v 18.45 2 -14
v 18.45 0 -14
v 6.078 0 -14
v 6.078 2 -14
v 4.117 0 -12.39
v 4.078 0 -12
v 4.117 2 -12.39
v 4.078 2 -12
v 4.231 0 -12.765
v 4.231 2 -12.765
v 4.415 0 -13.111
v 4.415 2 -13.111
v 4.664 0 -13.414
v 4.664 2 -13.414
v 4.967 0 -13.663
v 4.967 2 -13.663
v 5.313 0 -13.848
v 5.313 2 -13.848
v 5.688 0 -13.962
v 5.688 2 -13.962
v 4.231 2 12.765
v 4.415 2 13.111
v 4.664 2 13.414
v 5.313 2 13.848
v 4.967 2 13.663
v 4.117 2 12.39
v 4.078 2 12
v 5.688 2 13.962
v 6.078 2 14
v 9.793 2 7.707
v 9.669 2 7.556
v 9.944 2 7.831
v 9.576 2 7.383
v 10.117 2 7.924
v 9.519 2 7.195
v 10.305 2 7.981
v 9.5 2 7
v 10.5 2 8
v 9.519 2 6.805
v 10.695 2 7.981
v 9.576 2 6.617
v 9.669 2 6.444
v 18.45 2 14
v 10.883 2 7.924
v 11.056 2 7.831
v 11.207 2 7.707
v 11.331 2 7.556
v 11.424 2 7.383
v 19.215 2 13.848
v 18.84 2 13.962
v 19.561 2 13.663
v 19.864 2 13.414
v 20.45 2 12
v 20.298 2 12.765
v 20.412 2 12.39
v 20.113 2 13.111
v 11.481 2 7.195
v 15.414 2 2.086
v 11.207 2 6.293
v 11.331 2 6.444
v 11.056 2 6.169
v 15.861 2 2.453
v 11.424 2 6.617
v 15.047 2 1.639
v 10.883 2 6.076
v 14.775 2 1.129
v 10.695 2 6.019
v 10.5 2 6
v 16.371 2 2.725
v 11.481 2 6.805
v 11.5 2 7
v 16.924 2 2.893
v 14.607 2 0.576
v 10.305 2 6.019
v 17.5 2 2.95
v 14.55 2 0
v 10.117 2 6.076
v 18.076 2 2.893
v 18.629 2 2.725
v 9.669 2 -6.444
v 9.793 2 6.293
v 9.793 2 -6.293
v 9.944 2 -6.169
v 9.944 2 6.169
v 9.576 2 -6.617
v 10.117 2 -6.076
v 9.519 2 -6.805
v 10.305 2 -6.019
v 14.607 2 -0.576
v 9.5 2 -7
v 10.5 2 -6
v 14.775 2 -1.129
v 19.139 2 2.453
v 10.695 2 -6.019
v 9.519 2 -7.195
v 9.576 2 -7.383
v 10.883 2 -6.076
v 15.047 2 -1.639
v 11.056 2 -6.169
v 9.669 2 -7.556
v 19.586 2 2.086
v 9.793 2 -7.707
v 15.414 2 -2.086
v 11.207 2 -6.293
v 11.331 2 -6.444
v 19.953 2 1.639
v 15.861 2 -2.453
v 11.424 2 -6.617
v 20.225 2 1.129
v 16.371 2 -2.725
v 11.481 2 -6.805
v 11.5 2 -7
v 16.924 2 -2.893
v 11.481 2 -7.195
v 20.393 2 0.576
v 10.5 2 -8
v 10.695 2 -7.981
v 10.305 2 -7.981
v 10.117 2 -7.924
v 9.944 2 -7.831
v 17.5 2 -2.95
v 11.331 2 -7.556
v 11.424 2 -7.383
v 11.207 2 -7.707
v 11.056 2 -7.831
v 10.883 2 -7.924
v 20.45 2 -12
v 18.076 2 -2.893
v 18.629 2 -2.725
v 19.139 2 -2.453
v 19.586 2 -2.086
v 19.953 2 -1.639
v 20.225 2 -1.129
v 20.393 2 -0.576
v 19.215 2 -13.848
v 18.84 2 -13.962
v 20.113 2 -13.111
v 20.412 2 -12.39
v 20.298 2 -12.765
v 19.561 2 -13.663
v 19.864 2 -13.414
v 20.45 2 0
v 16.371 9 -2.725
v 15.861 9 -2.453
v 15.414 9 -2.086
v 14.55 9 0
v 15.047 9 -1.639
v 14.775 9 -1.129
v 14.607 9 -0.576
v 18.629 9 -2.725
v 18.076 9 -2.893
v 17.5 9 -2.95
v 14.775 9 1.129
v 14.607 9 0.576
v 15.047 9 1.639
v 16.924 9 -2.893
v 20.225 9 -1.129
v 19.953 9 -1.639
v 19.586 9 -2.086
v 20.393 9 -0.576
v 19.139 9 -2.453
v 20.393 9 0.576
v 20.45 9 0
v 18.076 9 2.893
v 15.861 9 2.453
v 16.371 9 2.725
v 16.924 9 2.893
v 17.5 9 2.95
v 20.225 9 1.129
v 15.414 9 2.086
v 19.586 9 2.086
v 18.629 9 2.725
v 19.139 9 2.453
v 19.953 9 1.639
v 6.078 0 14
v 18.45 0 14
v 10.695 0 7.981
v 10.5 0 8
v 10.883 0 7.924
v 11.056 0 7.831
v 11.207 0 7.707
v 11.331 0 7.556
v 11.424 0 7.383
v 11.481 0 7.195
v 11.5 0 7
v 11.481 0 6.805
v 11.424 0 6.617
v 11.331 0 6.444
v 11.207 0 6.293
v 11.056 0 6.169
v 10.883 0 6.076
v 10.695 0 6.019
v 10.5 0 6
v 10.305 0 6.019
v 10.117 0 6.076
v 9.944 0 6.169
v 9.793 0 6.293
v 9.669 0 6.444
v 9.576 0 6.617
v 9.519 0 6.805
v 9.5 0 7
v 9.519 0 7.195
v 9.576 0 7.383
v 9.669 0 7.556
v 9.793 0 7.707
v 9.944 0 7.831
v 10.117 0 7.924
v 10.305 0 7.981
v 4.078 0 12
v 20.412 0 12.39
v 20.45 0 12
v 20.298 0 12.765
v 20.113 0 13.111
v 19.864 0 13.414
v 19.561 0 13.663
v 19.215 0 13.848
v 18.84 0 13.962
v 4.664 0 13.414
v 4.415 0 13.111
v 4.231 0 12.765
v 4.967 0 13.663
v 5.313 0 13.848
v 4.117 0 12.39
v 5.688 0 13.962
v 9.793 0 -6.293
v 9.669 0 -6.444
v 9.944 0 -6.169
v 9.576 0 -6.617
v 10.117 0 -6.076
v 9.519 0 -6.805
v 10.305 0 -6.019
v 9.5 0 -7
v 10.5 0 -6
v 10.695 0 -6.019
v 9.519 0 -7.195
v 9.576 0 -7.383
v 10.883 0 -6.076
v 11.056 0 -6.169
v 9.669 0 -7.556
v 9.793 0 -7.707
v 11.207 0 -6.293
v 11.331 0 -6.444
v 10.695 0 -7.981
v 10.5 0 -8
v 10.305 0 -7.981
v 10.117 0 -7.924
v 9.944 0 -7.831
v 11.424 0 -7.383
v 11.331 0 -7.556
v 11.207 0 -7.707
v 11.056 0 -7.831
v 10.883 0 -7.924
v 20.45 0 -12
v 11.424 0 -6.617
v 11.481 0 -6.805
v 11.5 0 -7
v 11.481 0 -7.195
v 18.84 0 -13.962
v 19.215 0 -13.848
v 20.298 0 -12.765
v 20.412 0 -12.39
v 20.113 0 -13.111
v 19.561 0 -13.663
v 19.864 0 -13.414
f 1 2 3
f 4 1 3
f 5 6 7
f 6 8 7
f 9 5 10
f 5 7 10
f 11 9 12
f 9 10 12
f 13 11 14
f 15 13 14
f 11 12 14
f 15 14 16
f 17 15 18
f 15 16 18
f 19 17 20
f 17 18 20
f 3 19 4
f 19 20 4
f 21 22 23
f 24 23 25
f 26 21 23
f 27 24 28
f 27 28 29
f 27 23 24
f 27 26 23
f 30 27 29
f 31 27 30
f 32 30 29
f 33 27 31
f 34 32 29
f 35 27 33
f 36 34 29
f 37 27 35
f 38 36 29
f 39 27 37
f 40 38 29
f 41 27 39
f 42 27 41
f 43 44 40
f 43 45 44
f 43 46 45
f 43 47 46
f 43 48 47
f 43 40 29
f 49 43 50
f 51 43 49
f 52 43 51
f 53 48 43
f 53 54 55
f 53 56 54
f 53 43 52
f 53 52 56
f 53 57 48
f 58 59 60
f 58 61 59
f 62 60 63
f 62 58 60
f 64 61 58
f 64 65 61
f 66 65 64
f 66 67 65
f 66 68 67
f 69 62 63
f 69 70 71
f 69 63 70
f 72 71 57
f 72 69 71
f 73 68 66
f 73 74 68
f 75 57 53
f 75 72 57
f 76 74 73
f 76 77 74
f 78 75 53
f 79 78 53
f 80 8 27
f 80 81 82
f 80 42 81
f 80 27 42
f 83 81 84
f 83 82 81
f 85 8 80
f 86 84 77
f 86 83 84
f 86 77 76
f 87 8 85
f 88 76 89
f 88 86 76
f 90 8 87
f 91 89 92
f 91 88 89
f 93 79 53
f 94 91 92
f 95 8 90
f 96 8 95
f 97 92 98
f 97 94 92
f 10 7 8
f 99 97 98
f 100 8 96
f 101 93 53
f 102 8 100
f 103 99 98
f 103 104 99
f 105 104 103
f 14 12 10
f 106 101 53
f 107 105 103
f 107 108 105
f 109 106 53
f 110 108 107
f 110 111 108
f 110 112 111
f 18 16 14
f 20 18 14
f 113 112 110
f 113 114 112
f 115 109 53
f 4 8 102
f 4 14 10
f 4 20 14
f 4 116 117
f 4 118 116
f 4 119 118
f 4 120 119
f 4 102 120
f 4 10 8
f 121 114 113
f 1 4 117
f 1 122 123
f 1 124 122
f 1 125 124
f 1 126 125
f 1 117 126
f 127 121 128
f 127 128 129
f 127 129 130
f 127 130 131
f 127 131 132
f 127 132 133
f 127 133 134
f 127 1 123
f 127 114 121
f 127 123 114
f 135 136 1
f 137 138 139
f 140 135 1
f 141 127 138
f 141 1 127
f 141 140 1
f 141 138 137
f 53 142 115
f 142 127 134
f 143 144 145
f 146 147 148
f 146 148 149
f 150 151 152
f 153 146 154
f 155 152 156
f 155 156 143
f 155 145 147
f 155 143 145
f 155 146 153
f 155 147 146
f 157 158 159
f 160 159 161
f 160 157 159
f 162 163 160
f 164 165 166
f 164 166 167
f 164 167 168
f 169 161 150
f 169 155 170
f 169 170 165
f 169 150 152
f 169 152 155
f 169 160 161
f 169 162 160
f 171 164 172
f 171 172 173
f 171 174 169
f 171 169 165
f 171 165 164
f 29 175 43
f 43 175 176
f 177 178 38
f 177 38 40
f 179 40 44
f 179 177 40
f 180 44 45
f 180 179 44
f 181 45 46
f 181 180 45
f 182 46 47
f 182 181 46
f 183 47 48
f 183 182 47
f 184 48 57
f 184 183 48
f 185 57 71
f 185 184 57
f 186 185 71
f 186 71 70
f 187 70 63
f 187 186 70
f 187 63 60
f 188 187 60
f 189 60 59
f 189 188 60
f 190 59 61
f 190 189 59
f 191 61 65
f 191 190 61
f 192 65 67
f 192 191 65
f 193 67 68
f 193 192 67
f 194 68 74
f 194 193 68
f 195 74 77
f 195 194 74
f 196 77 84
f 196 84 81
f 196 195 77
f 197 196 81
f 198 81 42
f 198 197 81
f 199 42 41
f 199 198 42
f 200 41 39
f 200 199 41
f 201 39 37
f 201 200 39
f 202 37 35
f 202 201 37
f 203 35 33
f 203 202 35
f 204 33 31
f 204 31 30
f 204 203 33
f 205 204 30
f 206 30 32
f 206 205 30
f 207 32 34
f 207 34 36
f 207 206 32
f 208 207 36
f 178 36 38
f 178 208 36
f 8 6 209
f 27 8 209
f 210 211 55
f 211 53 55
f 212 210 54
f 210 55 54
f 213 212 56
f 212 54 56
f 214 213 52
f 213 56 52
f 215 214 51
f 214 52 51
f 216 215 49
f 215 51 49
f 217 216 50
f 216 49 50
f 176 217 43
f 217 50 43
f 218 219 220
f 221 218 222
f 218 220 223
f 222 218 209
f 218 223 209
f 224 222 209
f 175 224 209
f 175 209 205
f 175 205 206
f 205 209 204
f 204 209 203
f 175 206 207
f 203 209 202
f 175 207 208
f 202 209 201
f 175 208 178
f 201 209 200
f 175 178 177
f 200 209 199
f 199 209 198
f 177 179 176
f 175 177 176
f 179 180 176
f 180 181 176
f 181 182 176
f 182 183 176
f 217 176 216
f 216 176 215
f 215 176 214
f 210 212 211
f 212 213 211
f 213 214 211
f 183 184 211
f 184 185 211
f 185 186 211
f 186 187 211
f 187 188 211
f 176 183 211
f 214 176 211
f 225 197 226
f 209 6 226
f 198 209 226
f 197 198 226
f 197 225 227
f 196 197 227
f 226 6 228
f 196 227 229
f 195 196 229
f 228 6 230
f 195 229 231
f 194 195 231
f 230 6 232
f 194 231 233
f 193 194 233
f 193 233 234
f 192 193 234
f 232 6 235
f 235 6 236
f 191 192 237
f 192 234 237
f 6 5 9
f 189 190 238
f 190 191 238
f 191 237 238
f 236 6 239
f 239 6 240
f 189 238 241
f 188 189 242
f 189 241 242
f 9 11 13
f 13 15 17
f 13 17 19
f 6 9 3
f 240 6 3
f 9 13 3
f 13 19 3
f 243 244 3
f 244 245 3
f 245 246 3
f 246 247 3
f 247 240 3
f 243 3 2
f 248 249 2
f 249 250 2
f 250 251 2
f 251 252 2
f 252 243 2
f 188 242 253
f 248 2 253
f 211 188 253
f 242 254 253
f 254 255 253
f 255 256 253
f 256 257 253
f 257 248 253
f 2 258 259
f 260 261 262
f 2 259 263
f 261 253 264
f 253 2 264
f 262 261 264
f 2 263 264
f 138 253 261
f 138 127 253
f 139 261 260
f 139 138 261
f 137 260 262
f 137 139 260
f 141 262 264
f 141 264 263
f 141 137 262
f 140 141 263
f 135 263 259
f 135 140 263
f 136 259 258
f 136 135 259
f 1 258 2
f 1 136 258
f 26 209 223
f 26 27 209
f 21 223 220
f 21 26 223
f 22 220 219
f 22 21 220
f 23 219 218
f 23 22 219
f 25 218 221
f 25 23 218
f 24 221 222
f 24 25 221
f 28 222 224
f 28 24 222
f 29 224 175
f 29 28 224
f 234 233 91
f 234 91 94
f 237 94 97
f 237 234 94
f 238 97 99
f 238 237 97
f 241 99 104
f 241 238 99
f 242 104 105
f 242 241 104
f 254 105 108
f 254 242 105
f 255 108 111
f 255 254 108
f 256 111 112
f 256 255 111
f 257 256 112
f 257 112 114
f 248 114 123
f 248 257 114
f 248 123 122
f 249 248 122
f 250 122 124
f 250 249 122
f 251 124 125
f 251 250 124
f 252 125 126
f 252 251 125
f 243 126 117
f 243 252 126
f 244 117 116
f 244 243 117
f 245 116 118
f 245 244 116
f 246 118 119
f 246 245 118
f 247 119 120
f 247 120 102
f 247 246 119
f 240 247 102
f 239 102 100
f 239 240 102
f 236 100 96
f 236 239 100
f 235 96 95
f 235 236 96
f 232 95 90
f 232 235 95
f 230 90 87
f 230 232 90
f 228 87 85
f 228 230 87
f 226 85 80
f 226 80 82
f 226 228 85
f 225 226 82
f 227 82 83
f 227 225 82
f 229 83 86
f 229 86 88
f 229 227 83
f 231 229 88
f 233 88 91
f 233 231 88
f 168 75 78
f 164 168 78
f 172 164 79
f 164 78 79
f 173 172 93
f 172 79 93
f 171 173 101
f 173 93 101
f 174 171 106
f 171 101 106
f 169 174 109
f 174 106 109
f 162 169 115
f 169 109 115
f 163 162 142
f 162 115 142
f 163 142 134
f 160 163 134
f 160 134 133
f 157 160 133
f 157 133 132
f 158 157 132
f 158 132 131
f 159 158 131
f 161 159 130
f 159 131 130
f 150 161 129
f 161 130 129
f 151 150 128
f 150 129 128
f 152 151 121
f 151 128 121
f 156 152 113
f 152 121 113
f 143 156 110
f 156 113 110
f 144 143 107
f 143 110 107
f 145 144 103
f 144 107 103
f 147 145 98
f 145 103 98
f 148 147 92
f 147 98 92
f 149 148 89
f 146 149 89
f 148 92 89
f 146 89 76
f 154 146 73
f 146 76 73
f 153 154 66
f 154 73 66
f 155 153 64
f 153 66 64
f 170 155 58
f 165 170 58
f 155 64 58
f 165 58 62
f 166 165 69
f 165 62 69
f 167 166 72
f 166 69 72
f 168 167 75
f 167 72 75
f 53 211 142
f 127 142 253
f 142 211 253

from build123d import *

# Parameters (mm, degrees)
SKETCH_1_R      = 2.95
EXTRUDE_1_DEPTH = 9
SKETCH_2_R      = 1
EXTRUDE_2_DEPTH = 2
FILLET_1_R      = 2


with BuildPart() as part:
    # 草图1 → 凸台-拉伸1 (new body)
    with BuildSketch(Plane(origin=(0, 0, 0), x_dir=(1, 0, 0), z_dir=(0, 1, 0))):
        with Locations(Location((17.5, 0, 0), (0, 0, 270))):
            Circle(SKETCH_1_R)
    extrude(amount=EXTRUDE_1_DEPTH)

    # 草图2 → 凸台-拉伸2 (add)
    with BuildSketch(Plane(origin=(0, 0, 0), x_dir=(1, 0, 0), z_dir=(0, 1, 0))):
        Polygon((4.078263357, 14), (4.078263357, -14), (20, -14), (20.45, -14), (20.45, 14), (20, 14), align=None)
        with Locations(Location((10.5, -7, 0), (0, 0, 270))):
            Circle(SKETCH_2_R, mode=Mode.SUBTRACT)
        with Locations(Location((10.5, 7, 0), (0, 0, 270))):
            Circle(SKETCH_2_R, mode=Mode.SUBTRACT)
    extrude(amount=EXTRUDE_2_DEPTH)

    # 圆角1
    fillet_1_edges = [part.edges().sort_by_distance(p)[0] for p in [
        (4.078263357, 1, 14),
        (20.45, 1, 14),
        (20.45, 1, -14),
        (4.078263357, 1, -14),
    ]]
    fillet(fillet_1_edges, radius=FILLET_1_R)


solid = part.part
